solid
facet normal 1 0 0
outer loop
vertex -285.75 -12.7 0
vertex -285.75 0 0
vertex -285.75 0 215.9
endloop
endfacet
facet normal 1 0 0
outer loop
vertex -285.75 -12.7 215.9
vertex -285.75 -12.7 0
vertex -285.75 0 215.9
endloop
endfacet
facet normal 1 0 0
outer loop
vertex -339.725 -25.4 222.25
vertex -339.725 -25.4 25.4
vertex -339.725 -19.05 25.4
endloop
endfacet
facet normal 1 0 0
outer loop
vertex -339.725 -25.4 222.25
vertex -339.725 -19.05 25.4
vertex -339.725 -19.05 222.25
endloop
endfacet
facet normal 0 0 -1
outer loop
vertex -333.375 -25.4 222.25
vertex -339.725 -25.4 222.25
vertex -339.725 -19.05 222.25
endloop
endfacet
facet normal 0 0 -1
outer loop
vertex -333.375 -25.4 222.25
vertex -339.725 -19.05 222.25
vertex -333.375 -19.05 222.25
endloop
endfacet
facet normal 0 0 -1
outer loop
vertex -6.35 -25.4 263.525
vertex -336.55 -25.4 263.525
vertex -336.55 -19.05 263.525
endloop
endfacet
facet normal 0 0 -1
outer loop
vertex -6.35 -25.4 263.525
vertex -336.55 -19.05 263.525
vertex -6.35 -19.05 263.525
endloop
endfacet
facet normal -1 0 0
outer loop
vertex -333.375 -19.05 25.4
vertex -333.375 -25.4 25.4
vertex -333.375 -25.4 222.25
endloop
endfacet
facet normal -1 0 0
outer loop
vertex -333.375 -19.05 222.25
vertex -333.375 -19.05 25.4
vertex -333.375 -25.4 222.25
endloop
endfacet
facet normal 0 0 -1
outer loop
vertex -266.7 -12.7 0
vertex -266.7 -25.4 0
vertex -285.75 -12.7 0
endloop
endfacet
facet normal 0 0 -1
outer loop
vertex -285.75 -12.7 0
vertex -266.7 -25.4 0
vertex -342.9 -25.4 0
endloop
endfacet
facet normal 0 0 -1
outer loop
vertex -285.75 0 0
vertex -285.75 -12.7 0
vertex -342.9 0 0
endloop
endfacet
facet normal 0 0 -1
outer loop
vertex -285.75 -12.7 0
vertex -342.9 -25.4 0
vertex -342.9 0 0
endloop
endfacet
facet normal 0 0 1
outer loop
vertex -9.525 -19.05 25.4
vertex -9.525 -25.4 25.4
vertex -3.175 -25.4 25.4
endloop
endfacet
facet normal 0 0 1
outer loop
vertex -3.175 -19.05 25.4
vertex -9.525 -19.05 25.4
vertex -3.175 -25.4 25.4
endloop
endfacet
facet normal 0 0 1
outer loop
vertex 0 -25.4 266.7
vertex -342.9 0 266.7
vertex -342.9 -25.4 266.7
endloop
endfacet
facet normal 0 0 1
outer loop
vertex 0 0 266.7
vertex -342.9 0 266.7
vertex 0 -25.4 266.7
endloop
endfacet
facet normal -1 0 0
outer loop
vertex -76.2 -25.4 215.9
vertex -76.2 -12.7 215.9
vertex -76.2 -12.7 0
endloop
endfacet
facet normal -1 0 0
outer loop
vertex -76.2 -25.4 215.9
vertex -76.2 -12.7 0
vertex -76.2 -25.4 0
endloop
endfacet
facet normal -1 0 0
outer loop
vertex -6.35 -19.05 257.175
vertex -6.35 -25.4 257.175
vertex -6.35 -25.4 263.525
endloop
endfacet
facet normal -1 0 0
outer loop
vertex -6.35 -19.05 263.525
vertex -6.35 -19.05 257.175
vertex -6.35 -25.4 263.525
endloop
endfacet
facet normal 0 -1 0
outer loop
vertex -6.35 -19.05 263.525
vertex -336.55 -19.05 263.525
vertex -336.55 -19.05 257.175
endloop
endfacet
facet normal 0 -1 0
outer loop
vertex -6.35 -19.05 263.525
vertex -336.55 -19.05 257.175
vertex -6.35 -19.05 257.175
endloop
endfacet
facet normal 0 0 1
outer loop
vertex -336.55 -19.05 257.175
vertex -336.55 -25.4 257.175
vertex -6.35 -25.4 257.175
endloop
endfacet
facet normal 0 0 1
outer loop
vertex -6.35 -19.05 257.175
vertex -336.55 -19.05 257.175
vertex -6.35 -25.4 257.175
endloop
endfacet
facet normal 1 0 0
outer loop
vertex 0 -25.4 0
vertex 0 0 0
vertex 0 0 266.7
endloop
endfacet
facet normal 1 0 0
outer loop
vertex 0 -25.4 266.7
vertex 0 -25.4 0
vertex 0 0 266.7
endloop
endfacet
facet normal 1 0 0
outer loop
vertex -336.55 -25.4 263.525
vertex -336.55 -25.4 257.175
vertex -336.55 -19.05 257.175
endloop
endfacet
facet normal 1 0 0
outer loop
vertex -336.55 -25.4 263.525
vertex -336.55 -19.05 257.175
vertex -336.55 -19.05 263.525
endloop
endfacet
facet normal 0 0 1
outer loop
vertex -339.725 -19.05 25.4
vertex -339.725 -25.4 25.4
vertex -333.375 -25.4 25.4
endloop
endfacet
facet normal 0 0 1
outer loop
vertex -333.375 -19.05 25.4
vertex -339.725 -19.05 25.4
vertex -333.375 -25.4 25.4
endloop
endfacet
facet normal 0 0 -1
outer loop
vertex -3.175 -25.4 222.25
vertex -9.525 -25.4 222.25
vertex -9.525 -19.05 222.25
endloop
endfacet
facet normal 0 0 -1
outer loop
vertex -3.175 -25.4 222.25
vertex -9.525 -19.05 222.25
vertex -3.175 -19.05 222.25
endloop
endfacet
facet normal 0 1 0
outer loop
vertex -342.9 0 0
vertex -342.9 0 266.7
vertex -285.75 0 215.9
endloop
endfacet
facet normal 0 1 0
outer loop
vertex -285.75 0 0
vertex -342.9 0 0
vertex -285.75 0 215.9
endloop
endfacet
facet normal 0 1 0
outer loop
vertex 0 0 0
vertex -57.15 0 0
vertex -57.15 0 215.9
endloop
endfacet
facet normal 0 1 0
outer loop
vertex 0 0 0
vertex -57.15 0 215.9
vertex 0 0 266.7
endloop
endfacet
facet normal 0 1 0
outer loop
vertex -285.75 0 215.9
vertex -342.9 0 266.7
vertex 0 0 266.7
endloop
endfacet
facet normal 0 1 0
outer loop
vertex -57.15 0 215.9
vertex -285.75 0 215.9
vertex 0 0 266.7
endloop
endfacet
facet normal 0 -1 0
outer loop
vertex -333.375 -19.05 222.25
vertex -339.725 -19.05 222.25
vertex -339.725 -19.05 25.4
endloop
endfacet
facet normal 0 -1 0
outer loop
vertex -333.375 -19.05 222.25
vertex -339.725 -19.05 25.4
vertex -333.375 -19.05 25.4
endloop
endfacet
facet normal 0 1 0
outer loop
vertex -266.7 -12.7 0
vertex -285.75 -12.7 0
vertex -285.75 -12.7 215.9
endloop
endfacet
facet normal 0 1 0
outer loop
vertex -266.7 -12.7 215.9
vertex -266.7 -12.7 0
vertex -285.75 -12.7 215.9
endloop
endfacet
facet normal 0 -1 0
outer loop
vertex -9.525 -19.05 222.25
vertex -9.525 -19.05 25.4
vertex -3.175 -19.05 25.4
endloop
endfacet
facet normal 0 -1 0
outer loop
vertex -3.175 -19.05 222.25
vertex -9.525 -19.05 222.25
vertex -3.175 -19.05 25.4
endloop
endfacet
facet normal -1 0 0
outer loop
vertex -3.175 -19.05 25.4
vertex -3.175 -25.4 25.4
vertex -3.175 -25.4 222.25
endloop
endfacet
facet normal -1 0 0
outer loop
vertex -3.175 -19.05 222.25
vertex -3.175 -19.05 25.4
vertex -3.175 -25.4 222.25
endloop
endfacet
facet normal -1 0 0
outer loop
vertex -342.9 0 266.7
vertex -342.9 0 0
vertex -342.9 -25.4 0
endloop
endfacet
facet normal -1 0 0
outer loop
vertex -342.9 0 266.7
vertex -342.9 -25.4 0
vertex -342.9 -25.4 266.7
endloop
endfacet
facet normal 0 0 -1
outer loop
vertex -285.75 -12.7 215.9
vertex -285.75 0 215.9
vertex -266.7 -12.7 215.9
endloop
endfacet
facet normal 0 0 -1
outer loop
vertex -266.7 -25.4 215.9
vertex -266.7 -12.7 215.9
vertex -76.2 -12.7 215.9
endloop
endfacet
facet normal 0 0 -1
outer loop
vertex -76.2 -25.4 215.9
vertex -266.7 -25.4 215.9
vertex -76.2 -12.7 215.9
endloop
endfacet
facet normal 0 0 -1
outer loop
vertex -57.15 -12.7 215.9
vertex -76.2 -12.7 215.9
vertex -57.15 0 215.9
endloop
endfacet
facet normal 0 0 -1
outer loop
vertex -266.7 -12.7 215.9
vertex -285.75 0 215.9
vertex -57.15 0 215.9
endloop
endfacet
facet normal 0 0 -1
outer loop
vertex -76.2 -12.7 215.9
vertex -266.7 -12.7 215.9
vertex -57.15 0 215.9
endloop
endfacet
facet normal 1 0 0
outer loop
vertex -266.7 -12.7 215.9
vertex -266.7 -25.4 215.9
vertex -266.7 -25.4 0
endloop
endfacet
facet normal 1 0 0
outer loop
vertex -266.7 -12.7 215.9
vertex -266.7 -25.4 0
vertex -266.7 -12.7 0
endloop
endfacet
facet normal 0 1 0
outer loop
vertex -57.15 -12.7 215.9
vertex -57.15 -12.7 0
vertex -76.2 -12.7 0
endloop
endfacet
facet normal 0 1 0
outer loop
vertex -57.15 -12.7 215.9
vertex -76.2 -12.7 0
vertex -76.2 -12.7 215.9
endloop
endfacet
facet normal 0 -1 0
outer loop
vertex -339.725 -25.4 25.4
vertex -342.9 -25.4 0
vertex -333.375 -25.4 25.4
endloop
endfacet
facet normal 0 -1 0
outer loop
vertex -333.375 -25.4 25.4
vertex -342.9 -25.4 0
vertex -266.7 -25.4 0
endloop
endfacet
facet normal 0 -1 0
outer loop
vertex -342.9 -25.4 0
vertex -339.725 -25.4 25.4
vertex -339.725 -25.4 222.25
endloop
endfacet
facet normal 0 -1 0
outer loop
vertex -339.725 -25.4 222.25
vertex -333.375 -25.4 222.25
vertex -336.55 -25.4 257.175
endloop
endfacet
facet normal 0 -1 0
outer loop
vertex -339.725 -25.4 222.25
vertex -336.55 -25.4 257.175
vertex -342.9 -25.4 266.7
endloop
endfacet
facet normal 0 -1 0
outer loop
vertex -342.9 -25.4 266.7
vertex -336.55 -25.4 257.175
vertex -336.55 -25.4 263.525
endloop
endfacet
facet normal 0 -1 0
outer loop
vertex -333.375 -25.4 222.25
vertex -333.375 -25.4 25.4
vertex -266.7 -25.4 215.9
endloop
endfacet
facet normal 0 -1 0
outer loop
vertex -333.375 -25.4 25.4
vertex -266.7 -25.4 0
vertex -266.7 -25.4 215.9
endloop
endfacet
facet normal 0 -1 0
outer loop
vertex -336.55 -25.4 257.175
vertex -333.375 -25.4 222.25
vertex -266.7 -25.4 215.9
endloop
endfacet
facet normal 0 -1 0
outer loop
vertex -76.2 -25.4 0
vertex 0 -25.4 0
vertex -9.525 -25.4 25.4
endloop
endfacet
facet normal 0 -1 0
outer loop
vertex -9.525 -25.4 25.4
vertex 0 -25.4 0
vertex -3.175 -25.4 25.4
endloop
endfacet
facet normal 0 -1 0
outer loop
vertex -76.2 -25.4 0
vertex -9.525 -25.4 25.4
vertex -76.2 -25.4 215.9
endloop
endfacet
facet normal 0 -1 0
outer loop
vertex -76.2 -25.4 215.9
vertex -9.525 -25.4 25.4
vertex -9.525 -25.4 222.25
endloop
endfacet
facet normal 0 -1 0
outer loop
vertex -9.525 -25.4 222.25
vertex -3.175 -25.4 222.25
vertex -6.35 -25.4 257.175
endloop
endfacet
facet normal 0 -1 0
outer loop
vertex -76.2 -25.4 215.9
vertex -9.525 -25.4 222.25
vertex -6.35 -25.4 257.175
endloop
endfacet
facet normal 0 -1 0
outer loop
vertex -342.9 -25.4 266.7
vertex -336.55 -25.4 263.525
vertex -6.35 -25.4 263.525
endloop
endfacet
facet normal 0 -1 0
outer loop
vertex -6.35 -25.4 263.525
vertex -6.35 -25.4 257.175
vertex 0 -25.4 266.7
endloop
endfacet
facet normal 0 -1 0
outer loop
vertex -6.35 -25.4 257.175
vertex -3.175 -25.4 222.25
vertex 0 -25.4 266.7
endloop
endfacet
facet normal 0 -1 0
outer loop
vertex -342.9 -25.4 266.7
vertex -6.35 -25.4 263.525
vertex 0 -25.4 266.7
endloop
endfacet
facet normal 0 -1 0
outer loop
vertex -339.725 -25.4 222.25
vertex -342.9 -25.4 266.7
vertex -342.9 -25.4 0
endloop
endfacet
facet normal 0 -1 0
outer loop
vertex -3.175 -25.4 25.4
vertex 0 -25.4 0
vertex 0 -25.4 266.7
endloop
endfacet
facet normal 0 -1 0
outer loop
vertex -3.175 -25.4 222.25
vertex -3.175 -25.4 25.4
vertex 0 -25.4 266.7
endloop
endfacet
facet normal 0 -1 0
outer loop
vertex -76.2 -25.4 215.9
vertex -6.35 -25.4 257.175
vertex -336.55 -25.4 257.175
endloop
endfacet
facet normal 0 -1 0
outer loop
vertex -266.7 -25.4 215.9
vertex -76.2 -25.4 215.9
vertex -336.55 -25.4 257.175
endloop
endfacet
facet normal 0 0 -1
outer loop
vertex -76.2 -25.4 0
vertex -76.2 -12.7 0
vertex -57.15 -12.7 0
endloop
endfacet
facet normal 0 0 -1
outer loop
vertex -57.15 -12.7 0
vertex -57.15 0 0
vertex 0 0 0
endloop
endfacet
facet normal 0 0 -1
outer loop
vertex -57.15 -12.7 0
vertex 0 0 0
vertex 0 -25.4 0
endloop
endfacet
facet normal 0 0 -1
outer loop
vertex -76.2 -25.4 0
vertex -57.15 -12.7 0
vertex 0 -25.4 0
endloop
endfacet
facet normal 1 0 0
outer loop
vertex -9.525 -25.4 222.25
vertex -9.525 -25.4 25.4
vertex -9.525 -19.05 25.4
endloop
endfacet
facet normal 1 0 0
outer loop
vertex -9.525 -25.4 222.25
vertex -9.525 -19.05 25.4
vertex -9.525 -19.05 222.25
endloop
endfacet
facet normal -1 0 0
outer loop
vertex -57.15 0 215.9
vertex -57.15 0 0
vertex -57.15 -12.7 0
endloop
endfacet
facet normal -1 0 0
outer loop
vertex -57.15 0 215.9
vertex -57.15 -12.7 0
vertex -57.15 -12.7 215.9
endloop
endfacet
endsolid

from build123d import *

# Parameters (mm, degrees)
F0_W      = 342.9
F0_H      = 266.7
F1_DEPTH  = 25.4
F2_W      = 114.3
F2_H      = 215.9
F3_DEPTH  = 25.4
F4_W      = 12.7
F4_H      = 215.9
F5_DEPTH  = 19.05
F6_W      = 12.7
F6_H      = 215.9
F7_DEPTH  = 19.05
F9_W      = 330.2
F9_H      = 6.35
F10_DEPTH = 6.35
F11_W     = 6.35
F11_H     = 196.85
F12_DEPTH = 6.35


# Not quite as in the source:
# - a feature names something its author has since deleted; it is built from what else it names


with BuildPart() as f1:
    # F0 (on Front) → F1 (new body)
    with BuildSketch(Plane.XZ):
        with Locations((-171.45, 133.35)):
            Rectangle(F0_W, F0_H)
    extrude(amount=F1_DEPTH)

    # F2 (on face) → F3 (cut)
    with BuildSketch(Plane(origin=(0, 0, 0), x_dir=(-1, 0, 0), z_dir=(0, 1, 0))):
        with Locations((228.6, 107.95)):
            Rectangle(F2_W, F2_H)
        with Locations((114.3, 107.95)):
            Rectangle(F2_W, F2_H)
    extrude(amount=-F3_DEPTH, mode=Mode.SUBTRACT)

    # F4 (on face) → F5 (join)
    with BuildSketch(Plane.YZ.offset(-285.75)):
        with Locations((-19.05, 107.95)):
            Rectangle(F4_W, F4_H)
    extrude(amount=F5_DEPTH)

    # F6 (on face) → F7 (join)
    with BuildSketch(Plane(origin=(-57.15, 0, 0), x_dir=(0, -1, 0), z_dir=(-1, 0, 0))):
        with Locations((19.05, 107.95)):
            Rectangle(F6_W, F6_H)
    extrude(amount=F7_DEPTH)

    # F9 (on face) → F10 (cut)
    with BuildSketch(Plane.XZ.offset(25.4)):
        with Locations((-171.45, 260.35)):
            Rectangle(F9_W, F9_H)
    extrude(amount=-F10_DEPTH, mode=Mode.SUBTRACT)

    # F11 (on face) → F12 (cut)
    with BuildSketch(Plane.XZ.offset(25.4)):
        with Locations((-336.55, 123.825)):
            Rectangle(F11_W, F11_H)
        with Locations((-6.35, 123.825)):
            Rectangle(F11_W, F11_H)
    extrude(amount=-F12_DEPTH, mode=Mode.SUBTRACT)


solid = f1.part
